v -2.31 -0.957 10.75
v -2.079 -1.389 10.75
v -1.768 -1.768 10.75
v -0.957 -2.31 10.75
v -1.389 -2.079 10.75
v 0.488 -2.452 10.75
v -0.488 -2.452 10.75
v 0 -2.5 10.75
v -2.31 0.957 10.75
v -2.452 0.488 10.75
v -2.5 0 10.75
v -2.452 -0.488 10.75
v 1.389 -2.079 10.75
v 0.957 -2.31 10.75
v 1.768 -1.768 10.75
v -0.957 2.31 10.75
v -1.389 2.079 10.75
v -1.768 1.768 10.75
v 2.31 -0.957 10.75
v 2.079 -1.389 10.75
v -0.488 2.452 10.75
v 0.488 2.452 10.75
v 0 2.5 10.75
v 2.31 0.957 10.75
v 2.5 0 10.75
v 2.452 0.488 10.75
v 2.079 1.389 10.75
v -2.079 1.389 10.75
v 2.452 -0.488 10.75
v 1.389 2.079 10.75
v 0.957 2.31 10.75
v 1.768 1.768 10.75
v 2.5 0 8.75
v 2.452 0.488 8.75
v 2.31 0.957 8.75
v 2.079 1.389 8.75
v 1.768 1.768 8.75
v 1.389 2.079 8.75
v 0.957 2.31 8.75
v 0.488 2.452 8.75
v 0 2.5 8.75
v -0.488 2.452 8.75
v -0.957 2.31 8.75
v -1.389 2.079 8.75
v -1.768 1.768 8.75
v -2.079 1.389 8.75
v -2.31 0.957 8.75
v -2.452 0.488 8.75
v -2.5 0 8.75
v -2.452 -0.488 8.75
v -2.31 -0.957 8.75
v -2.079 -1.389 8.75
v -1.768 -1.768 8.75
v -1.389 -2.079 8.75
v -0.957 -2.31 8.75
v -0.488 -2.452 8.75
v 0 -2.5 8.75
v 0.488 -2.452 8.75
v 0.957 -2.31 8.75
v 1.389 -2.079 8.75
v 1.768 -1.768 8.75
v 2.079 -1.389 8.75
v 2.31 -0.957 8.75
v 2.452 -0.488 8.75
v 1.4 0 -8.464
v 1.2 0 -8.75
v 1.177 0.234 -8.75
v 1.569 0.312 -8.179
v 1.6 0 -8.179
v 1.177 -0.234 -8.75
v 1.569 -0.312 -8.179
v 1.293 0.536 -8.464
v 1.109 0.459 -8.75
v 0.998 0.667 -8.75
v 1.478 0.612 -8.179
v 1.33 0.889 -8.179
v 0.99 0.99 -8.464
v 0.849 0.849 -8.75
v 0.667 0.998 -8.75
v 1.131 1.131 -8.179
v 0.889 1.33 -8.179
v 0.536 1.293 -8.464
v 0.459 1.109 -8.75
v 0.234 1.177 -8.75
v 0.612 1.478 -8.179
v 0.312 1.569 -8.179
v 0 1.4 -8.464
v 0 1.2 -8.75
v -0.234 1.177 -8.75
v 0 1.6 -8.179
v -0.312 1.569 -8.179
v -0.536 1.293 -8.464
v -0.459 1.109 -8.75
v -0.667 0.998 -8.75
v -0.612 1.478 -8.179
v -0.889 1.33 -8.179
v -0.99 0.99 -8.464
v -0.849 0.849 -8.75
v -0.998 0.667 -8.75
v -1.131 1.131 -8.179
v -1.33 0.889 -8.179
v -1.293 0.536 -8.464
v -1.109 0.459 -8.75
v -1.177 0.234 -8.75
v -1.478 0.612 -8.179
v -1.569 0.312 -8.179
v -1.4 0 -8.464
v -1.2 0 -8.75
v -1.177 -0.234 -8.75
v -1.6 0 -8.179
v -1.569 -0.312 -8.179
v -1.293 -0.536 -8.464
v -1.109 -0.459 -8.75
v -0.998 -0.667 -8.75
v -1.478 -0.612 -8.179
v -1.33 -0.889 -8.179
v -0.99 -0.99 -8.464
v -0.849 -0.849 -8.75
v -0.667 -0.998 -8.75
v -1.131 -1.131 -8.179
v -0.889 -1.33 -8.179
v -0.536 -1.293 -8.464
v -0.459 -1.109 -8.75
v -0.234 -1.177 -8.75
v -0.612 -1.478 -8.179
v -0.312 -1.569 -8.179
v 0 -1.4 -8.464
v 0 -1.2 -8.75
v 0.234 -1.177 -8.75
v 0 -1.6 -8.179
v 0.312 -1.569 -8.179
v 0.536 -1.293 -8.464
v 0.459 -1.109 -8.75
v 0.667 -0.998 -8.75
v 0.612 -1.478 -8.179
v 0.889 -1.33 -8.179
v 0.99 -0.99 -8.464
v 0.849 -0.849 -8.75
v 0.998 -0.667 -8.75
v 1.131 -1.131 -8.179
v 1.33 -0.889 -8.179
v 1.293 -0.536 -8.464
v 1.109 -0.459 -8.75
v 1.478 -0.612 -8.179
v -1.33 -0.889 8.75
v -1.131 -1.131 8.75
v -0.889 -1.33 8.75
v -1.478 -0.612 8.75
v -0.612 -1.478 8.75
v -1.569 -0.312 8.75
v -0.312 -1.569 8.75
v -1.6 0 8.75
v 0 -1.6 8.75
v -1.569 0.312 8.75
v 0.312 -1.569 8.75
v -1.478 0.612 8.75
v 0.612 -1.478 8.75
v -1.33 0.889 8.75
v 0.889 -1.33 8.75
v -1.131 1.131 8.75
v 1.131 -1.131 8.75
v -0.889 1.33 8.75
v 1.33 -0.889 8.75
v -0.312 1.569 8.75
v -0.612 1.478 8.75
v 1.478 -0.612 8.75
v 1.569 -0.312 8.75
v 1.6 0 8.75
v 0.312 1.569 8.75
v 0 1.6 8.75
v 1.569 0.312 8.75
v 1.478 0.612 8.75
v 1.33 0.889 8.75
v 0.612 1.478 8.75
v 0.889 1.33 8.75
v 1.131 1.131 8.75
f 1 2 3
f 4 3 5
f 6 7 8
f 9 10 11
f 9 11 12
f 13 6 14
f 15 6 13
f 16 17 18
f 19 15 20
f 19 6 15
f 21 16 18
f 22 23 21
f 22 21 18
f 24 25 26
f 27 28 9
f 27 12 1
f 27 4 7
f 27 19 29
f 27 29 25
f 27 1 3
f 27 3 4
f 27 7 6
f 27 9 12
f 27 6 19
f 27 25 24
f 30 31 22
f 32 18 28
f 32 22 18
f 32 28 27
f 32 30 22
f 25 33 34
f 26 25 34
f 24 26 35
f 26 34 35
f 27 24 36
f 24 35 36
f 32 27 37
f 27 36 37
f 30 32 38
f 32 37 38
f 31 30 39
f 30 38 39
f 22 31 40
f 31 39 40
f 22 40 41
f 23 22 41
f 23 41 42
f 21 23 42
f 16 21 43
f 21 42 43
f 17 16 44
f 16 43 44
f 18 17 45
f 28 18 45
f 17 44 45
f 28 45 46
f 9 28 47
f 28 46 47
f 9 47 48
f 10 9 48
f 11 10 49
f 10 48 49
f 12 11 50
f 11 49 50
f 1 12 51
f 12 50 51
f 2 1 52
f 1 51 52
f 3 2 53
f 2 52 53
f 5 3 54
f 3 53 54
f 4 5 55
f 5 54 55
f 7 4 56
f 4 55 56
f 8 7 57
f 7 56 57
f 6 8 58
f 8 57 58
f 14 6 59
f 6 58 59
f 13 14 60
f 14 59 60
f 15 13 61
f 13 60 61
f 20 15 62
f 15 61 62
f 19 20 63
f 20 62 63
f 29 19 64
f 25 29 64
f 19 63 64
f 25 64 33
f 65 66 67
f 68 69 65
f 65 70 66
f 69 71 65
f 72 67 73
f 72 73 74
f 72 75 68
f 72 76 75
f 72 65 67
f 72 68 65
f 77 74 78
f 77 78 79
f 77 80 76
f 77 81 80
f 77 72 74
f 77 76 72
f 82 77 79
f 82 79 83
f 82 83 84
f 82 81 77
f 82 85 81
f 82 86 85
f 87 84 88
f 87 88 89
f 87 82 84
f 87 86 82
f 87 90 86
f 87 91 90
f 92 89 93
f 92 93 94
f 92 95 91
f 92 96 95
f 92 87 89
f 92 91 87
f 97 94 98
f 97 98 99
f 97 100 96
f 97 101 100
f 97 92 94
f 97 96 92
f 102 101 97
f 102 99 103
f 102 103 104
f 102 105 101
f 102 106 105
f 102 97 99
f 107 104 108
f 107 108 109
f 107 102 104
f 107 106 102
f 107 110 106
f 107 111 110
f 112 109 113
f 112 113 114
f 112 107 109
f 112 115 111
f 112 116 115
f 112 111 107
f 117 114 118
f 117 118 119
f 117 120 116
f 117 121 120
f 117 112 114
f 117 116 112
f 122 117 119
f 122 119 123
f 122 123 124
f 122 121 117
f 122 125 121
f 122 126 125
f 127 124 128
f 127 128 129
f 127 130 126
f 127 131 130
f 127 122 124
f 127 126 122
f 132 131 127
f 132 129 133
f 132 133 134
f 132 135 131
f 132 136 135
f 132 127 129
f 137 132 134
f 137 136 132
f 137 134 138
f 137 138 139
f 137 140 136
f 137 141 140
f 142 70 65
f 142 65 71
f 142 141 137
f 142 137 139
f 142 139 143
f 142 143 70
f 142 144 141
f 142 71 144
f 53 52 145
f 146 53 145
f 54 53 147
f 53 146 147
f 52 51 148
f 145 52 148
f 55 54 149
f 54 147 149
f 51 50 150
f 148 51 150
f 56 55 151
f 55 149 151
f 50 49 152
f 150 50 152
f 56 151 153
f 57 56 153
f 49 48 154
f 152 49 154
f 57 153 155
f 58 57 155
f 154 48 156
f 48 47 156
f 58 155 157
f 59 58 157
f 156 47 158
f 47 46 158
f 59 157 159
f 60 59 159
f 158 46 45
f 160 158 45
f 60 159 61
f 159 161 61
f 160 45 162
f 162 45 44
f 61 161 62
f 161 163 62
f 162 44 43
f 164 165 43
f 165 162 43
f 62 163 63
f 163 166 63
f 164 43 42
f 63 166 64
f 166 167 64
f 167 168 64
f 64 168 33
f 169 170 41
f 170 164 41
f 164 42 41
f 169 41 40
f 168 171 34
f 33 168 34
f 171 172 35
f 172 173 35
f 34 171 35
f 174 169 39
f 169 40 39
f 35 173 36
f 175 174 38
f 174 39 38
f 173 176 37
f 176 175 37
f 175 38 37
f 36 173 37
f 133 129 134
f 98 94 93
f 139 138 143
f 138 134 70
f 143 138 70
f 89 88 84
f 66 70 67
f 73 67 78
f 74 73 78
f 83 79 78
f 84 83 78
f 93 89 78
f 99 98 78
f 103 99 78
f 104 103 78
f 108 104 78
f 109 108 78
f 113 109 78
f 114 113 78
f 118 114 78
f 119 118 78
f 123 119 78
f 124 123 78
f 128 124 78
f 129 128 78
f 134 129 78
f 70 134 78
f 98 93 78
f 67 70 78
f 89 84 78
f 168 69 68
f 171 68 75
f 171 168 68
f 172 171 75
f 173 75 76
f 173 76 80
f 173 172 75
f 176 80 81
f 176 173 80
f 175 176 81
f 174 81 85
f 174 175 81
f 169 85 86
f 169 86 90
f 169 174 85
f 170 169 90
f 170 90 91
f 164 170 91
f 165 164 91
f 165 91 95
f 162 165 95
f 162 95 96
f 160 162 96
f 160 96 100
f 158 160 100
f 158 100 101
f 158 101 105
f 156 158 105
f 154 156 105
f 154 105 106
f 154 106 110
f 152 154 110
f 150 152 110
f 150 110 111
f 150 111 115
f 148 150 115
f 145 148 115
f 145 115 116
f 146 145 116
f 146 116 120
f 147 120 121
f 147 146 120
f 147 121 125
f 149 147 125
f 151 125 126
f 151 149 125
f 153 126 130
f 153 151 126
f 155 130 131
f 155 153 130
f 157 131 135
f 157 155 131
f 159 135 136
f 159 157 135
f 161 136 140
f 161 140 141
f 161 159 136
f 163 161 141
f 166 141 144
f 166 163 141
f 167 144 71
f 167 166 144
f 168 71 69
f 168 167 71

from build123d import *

# Parameters (mm, degrees)
SKETCH1_R           = 1.6
BOSS_EXTRUDE1_DEPTH = 8.75
CHAMFER1_SIZE       = 0.4
CHAMFER1_SIZE2      = 0.571259203
SKETCH2_R           = 2.5
BOSS_EXTRUDE2_DEPTH = 2


with BuildPart() as part:
    # Sketch1 → Boss-Extrude1 (new, symmetric)
    with BuildSketch(Plane.XY):
        Circle(SKETCH1_R)
    extrude(amount=BOSS_EXTRUDE1_DEPTH, both=True)

    # Chamfer1
    chamfer1_edges = [part.edges().sort_by_distance(p)[0] for p in [
        (-1.6, 0, -8.75),
    ]]
    chamfer1_side = [part.faces().sort_by_distance(p)[0] for p in [
        (0, 0, -8.75),
    ]]
    chamfer(chamfer1_edges, length=CHAMFER1_SIZE, length2=CHAMFER1_SIZE2, reference=chamfer1_side[0])

    # Sketch2 → Boss-Extrude2 (add)
    with BuildSketch(Plane.XY.offset(8.75)):
        Circle(SKETCH2_R)
    extrude(amount=BOSS_EXTRUDE2_DEPTH)


solid = part.part
